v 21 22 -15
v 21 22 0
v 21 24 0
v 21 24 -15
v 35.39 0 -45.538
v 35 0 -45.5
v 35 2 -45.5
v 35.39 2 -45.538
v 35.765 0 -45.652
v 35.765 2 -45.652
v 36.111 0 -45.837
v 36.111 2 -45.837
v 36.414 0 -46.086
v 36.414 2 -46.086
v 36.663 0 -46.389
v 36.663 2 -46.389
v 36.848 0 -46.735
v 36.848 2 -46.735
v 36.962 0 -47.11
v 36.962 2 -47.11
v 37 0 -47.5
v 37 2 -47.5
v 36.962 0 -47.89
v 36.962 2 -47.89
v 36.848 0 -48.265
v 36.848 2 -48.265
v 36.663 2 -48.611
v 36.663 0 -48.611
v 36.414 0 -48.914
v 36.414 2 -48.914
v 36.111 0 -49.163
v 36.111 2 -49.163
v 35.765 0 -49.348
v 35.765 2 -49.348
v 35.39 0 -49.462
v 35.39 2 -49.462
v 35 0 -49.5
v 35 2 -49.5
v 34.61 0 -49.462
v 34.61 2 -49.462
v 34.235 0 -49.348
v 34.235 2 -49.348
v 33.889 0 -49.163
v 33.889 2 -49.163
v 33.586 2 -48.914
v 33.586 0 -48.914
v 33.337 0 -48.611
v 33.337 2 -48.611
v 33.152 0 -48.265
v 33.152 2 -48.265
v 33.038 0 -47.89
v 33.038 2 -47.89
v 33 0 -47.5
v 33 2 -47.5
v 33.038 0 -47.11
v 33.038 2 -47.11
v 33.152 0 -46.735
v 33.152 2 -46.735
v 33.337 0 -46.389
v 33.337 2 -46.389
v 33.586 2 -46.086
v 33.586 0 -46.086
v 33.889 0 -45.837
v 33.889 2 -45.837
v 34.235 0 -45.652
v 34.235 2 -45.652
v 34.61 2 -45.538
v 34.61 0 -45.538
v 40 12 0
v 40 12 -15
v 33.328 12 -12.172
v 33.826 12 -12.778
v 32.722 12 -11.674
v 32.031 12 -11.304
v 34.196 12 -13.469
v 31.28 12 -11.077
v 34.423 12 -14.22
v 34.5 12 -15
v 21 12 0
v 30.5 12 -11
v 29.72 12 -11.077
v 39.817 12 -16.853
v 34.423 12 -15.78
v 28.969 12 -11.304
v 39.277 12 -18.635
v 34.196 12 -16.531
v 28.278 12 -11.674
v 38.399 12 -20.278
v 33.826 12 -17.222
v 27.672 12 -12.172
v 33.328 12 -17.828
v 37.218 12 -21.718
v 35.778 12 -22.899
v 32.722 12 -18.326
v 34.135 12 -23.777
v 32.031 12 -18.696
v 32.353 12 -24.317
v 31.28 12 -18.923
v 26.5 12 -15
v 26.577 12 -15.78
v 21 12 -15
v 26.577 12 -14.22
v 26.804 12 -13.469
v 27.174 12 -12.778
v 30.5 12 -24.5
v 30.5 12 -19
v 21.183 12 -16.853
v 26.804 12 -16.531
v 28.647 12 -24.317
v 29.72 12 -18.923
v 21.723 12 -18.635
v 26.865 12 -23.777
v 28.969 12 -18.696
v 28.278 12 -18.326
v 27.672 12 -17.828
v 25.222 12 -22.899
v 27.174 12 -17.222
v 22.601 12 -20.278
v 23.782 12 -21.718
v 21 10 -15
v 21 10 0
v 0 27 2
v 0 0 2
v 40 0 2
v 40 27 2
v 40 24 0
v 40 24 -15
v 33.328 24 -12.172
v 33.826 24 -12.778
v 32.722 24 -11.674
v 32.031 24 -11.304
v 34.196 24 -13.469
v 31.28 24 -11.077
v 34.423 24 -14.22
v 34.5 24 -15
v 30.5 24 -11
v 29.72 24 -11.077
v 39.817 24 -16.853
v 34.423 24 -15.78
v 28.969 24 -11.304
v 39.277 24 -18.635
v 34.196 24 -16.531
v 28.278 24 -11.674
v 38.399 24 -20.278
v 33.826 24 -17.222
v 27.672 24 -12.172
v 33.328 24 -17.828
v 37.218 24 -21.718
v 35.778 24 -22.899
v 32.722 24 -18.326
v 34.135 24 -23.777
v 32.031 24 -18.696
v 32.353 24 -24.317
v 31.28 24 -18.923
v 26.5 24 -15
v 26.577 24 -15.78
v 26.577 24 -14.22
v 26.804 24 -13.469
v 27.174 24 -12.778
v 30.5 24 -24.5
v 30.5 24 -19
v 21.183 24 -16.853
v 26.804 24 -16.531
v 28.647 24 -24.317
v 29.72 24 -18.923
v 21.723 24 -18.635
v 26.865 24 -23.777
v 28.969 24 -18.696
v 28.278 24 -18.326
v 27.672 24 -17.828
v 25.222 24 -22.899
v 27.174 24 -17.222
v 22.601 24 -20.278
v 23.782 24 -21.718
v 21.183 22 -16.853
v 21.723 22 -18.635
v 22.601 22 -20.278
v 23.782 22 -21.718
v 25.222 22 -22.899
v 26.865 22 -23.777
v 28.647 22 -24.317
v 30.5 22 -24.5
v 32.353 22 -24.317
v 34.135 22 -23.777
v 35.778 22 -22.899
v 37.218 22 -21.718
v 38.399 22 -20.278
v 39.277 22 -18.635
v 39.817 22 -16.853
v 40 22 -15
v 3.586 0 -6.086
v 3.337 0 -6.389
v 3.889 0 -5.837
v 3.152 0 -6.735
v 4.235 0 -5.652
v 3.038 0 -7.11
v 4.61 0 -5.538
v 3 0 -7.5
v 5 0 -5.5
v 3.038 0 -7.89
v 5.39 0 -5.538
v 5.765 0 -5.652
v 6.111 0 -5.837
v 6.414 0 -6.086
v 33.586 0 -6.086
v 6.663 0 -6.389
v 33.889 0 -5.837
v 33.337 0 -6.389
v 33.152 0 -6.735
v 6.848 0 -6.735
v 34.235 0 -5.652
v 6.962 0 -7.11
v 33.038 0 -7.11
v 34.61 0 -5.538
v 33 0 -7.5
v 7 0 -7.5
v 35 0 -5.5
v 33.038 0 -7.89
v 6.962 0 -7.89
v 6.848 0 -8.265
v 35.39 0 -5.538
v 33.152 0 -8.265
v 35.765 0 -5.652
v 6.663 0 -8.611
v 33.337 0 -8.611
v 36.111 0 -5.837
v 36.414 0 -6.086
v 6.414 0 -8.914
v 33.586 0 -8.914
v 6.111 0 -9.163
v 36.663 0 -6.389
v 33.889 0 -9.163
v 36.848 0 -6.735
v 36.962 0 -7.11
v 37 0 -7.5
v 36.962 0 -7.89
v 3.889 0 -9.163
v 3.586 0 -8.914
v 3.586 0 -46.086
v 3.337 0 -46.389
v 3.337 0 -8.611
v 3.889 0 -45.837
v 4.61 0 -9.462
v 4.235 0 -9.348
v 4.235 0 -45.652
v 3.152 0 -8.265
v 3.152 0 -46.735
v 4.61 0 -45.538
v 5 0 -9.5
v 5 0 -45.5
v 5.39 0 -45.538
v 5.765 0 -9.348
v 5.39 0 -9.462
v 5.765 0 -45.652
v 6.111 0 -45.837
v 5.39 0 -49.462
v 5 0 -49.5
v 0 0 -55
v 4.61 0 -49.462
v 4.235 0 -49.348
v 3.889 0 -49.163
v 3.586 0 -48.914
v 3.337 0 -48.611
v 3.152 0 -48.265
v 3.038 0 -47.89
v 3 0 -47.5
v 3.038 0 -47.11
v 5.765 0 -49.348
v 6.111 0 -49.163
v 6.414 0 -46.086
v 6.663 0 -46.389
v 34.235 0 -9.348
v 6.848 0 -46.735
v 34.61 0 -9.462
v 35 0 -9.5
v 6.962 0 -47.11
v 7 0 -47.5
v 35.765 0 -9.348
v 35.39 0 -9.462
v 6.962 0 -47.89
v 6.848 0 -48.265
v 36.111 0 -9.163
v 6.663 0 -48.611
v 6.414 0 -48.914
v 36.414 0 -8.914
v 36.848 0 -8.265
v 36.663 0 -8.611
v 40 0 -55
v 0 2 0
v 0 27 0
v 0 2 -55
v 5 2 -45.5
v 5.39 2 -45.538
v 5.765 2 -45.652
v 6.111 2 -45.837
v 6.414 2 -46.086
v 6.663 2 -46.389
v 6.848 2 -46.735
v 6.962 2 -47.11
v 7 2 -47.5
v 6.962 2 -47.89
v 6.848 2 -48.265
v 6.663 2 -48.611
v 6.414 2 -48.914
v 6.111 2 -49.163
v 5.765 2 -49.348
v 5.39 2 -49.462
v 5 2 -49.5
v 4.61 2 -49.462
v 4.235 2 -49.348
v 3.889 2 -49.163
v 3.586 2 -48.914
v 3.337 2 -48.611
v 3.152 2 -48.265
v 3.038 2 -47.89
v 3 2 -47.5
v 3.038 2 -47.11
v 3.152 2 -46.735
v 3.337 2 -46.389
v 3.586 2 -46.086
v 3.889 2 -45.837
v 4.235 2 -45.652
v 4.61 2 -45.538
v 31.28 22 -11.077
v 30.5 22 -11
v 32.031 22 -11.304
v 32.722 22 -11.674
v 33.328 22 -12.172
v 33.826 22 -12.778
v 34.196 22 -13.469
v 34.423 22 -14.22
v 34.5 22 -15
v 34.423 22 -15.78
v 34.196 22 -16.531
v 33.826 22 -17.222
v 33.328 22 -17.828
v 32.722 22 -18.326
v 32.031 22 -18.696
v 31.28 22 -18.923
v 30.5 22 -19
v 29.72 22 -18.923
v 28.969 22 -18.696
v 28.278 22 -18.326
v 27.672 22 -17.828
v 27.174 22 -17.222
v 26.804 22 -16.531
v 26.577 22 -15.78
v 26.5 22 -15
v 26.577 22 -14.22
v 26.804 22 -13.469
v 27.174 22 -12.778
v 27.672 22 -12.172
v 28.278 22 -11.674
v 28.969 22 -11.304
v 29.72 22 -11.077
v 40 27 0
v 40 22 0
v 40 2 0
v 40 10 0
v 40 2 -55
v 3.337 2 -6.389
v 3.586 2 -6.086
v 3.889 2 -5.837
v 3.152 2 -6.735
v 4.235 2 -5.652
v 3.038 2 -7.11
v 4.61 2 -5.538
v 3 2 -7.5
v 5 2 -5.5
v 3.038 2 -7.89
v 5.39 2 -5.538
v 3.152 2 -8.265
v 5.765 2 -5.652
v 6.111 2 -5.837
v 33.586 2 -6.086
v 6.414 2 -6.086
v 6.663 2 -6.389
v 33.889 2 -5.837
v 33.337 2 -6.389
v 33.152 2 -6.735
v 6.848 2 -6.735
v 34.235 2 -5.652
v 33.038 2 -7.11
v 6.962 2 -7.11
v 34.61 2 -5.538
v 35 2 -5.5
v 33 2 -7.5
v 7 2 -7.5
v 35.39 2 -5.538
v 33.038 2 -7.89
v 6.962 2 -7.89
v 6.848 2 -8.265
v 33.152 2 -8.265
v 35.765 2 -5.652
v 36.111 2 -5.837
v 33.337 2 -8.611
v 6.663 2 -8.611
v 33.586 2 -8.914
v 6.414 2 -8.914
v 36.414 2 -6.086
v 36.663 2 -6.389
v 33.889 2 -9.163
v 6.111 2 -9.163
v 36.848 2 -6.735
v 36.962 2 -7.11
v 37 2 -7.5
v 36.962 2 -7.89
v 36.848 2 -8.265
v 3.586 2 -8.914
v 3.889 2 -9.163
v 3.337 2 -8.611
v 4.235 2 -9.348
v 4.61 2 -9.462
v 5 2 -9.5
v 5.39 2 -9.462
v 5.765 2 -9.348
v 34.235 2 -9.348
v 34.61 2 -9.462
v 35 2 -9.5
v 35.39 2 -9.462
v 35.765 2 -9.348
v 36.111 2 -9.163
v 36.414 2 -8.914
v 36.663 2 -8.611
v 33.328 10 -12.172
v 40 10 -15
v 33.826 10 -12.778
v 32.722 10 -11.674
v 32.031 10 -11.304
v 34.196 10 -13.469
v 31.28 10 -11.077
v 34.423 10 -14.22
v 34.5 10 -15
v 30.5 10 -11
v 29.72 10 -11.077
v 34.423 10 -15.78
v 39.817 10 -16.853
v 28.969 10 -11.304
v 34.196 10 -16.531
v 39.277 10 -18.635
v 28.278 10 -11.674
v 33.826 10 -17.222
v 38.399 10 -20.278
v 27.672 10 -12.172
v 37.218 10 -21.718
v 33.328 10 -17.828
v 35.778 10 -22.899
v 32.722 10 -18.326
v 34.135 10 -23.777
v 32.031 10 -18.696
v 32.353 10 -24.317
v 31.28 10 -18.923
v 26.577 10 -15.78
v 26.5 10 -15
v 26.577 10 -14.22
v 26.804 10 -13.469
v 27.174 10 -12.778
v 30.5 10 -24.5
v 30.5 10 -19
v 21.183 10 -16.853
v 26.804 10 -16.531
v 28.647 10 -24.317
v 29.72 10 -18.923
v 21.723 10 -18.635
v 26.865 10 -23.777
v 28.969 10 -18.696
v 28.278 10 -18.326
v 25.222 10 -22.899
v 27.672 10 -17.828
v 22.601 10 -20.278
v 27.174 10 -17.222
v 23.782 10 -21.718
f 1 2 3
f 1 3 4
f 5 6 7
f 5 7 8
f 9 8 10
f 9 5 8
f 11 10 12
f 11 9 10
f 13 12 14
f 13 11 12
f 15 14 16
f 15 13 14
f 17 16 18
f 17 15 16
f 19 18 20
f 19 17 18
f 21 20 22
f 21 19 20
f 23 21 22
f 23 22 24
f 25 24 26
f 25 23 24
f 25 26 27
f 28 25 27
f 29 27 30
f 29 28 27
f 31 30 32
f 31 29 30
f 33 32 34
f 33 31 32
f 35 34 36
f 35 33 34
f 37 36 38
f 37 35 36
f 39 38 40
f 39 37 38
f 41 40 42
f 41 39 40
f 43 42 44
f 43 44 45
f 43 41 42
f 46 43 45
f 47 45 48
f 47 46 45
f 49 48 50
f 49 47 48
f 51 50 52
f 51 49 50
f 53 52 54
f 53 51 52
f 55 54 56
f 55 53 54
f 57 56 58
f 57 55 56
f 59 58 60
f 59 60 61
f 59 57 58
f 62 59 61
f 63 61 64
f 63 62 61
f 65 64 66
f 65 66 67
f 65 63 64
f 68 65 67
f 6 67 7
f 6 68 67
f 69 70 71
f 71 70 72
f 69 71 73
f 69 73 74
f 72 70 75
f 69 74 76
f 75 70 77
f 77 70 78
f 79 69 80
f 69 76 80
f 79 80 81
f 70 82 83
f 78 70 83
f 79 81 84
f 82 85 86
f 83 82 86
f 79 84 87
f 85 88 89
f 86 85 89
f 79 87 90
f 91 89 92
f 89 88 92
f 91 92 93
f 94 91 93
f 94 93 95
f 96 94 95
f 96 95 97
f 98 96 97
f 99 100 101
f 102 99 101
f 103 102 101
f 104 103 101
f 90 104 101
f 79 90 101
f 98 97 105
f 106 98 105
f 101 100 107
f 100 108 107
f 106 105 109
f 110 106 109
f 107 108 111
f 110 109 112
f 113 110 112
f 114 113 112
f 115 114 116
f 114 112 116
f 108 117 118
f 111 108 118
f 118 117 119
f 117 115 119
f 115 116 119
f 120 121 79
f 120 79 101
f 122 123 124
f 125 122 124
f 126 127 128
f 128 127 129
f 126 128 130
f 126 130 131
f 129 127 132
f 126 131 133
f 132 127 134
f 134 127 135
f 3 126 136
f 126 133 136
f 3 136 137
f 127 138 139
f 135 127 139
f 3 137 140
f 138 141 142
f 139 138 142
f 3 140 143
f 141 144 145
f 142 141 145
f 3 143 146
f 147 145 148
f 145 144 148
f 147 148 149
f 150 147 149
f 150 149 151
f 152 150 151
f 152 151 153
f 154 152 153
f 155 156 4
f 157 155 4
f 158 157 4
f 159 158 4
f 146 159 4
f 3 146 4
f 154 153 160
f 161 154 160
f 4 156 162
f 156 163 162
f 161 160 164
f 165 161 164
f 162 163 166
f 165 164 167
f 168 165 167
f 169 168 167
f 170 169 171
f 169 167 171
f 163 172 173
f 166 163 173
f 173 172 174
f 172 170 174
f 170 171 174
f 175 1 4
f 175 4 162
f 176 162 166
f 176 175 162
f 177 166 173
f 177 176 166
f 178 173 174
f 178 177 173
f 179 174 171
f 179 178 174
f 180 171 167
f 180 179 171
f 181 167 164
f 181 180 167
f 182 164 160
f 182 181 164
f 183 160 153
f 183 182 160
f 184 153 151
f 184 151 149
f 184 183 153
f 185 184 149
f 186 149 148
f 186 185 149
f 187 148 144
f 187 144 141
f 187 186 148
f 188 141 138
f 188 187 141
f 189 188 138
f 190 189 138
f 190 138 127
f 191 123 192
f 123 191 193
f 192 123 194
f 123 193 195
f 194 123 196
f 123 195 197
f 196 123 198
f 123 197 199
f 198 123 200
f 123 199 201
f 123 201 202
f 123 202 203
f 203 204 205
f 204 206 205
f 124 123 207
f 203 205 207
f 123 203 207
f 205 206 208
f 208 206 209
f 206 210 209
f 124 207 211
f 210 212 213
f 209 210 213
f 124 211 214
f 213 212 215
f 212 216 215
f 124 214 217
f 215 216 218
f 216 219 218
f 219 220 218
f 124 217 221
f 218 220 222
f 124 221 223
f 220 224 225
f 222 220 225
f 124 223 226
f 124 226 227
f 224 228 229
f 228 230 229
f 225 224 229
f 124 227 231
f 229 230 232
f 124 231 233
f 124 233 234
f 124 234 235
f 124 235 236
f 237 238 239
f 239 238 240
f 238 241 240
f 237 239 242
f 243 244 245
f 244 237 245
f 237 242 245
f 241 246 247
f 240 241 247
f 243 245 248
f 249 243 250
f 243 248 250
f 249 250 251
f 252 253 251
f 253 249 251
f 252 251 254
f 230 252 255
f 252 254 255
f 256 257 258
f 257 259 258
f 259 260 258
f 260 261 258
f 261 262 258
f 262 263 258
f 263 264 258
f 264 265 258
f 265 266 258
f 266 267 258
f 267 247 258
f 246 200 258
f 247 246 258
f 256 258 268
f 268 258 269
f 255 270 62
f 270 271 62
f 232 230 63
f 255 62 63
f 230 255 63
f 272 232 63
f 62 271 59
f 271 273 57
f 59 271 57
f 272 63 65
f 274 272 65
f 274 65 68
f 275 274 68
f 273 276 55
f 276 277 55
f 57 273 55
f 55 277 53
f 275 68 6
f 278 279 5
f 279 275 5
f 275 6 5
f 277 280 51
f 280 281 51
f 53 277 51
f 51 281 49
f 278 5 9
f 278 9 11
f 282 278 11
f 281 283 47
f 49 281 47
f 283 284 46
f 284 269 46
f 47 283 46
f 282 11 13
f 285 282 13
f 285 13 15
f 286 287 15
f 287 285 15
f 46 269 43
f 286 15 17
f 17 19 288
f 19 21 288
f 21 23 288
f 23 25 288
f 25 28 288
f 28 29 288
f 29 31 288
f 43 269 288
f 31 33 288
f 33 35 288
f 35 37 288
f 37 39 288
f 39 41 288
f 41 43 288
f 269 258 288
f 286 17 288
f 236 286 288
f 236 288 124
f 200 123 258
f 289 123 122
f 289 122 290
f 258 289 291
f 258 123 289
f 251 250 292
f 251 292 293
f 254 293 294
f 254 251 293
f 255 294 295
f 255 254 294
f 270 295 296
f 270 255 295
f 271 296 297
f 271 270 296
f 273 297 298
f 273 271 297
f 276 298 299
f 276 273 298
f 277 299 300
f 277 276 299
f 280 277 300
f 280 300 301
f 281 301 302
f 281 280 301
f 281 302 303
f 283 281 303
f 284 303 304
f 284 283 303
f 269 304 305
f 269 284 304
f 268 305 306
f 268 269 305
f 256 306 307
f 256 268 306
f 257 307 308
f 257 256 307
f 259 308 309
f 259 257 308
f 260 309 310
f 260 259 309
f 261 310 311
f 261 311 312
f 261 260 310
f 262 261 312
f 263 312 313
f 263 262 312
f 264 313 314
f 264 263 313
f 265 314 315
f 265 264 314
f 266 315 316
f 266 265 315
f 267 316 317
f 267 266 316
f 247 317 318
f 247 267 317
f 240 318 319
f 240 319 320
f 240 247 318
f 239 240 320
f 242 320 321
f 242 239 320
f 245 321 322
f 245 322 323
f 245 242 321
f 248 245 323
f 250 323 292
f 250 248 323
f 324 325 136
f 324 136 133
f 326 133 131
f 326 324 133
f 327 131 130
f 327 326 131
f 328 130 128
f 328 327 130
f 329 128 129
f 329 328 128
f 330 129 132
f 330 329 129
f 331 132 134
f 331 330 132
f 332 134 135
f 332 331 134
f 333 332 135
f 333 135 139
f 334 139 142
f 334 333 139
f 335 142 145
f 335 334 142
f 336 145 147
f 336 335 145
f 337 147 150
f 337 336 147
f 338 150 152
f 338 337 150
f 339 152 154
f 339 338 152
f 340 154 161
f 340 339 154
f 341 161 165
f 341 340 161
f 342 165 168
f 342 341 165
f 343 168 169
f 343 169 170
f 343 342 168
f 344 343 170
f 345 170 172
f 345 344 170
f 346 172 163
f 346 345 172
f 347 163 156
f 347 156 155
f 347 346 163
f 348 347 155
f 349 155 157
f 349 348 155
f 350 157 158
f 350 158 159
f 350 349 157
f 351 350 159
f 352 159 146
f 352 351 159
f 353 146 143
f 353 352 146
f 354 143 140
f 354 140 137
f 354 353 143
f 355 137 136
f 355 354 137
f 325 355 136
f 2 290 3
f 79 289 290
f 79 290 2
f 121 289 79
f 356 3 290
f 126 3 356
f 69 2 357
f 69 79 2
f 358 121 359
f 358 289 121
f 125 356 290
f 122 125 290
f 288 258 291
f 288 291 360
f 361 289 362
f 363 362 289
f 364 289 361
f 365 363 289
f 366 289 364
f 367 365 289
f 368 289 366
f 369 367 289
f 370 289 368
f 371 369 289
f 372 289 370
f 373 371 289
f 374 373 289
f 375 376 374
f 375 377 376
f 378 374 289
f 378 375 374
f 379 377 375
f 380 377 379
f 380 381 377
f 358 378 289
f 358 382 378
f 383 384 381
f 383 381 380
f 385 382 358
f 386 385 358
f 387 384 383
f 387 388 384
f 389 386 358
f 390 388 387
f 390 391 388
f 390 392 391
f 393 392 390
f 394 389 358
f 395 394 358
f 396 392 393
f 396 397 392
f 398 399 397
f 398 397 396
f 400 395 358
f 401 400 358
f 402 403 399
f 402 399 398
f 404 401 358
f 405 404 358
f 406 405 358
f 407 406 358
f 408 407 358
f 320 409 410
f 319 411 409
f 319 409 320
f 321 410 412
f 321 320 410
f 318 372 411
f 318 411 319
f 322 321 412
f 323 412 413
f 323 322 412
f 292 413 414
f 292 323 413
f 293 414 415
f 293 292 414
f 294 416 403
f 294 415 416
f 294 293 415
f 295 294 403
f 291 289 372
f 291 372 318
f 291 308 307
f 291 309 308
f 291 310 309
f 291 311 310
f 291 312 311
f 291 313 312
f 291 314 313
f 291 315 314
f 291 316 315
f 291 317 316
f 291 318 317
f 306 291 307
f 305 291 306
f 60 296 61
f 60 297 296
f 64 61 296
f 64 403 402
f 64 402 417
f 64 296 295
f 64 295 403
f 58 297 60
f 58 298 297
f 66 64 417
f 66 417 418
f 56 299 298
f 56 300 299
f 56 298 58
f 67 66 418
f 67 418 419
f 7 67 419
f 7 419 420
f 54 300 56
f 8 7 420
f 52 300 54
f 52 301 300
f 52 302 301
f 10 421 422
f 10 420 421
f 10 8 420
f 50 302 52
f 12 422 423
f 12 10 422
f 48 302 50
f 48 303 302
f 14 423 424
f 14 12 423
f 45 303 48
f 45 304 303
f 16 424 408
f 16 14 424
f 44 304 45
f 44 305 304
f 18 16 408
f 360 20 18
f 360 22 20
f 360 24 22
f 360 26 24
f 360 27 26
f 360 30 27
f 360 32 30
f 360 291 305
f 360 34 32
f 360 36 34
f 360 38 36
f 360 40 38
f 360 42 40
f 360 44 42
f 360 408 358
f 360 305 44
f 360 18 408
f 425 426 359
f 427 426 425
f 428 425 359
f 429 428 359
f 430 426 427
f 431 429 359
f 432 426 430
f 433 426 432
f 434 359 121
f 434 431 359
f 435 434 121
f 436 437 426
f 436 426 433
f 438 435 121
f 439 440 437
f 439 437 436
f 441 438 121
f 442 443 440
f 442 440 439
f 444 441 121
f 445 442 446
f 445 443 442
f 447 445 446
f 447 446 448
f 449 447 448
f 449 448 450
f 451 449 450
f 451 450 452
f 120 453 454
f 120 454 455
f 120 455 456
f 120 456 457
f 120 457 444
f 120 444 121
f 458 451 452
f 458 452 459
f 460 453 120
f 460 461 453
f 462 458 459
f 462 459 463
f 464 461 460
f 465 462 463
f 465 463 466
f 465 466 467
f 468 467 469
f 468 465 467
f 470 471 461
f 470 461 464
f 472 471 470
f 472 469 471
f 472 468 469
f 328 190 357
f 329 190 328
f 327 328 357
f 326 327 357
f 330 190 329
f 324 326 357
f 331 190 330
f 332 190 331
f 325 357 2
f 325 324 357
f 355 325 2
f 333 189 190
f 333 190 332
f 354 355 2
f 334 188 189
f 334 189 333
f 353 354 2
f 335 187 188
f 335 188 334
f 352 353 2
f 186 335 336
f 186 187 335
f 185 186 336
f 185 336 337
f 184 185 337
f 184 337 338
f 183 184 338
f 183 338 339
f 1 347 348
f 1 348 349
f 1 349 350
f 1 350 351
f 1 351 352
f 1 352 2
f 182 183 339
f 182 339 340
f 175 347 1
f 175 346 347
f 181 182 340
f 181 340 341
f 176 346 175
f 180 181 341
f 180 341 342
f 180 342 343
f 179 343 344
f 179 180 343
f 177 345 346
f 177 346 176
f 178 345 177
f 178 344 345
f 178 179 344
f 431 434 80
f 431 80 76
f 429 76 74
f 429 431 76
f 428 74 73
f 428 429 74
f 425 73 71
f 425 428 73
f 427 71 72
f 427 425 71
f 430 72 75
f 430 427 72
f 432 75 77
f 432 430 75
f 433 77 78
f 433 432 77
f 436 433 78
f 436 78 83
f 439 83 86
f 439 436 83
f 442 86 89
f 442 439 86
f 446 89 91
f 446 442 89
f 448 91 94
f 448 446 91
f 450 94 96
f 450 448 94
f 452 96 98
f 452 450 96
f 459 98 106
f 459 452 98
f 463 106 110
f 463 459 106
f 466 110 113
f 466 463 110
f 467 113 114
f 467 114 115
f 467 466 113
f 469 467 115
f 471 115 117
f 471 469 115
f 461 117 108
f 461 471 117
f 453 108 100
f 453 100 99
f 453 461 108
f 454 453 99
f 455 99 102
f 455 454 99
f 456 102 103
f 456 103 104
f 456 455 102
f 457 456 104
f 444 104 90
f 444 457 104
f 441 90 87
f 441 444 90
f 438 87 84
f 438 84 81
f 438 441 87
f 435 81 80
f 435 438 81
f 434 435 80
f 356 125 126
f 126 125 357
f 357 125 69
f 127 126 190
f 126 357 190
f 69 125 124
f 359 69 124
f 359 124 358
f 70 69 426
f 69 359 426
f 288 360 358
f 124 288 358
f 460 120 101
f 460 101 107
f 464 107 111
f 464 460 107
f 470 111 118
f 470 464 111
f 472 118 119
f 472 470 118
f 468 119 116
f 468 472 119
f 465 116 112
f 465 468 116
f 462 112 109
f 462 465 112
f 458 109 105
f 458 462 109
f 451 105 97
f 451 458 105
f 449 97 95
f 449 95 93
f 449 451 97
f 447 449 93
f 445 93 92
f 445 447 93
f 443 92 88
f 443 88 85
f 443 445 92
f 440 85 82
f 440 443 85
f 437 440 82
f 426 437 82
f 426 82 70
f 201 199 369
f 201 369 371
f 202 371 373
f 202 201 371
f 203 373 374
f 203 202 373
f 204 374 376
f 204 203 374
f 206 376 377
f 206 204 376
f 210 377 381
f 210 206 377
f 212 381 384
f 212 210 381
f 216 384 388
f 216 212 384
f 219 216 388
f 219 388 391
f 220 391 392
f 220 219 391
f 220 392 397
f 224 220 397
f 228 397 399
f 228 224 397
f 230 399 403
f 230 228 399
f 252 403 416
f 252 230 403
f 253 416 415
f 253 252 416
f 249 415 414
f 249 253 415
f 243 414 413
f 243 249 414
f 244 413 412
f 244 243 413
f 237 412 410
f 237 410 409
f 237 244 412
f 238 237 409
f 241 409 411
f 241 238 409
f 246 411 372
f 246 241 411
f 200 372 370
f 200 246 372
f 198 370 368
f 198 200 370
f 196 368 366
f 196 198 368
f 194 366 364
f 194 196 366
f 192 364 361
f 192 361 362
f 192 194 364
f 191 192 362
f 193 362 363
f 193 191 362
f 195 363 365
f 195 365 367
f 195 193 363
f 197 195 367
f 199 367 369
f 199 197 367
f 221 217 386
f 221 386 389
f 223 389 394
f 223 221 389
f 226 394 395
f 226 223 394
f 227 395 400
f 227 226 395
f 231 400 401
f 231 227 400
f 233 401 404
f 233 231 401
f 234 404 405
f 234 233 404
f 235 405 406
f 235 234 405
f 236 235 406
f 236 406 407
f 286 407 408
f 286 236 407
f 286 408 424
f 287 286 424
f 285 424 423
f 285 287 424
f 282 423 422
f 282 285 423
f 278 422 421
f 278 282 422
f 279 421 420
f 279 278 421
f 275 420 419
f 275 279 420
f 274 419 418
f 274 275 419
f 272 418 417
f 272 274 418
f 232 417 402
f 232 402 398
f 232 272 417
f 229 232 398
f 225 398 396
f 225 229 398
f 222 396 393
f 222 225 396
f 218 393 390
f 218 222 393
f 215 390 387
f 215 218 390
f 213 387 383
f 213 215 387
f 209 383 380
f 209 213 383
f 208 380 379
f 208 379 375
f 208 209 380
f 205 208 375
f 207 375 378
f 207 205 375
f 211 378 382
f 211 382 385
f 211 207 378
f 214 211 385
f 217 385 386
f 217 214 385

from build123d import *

# Parameters (mm, degrees)
CROQUIS2_W              = 40
CROQUIS2_H              = 55
CROQUIS2_R              = 2
SALIENTE_EXTRUIR1_DEPTH = 2
CROQUIS3_W              = 40
CROQUIS3_H              = 2
SALIENTE_EXTRUIR2_DEPTH = 42
CROQUIS4_R              = 4
SALIENTE_EXTRUIR3_DEPTH = 2
MATRIZL1_COUNT          = 2
MATRIZL1_PITCH          = 12
CROQUIS6_W              = 40
CROQUIS6_H              = 15
CORTAR_EXTRUIR1_DEPTH   = 10


with BuildPart() as part:
    # Croquis2 → Saliente-Extruir1 (new body)
    with BuildSketch(Plane(origin=(0, 0, 0), x_dir=(1, 0, 0), z_dir=(0, 1, 0))):
        with Locations((20, 27.5)):
            Rectangle(CROQUIS2_W, CROQUIS2_H)
        with Locations(Location((5, 47.5, 0), (0, 0, 270))):
            Circle(CROQUIS2_R, mode=Mode.SUBTRACT)
        with Locations(Location((35, 47.5, 0), (0, 0, 270))):
            Circle(CROQUIS2_R, mode=Mode.SUBTRACT)
        with Locations(Location((35, 7.5, 0), (0, 0, 270))):
            Circle(CROQUIS2_R, mode=Mode.SUBTRACT)
        with Locations(Location((5, 7.5, 0), (0, 0, 270))):
            Circle(CROQUIS2_R, mode=Mode.SUBTRACT)
    extrude(amount=SALIENTE_EXTRUIR1_DEPTH)

    # Croquis3 → Saliente-Extruir2 (add)
    with BuildSketch(Plane(origin=(0, 0, 0), x_dir=(1, 0, 0), z_dir=(0, 1, 0))):
        with Locations((20, -1)):
            Rectangle(CROQUIS3_W, CROQUIS3_H)
    extrude(amount=SALIENTE_EXTRUIR2_DEPTH)

    # Croquis4 → Saliente-Extruir3 (add)
    with BuildSketch(Plane(origin=(0, 22, 0), x_dir=(1, 0, 0), z_dir=(0, 1, 0))):
        with BuildLine():
            Line((40, 15), (40, 0))
            Line((40, 0), (21, 0))
            Line((21, 0), (21, 15))
            ThreePointArc((21, 15), (30.5, 24.5), (40, 15))
        make_face()
        with Locations(Location((30.5, 15, 0), (0, 0, 270))):
            Circle(CROQUIS4_R, mode=Mode.SUBTRACT)
    saliente_extruir3 = extrude(amount=SALIENTE_EXTRUIR3_DEPTH)

    # MatrizL1: Saliente-Extruir3 ×2
    with Locations(*[(0, -i * MATRIZL1_PITCH, 0) for i in range(1, MATRIZL1_COUNT)]):
        add(saliente_extruir3)

    # Croquis6 → Cortar-Extruir1 (cut)
    with BuildSketch(Plane(origin=(0, 0, 0), x_dir=(-1, 0, 0), z_dir=(0, 0, -1))):
        with Locations((-20, 34.5)):
            Rectangle(CROQUIS6_W, CROQUIS6_H)
    extrude(amount=-CORTAR_EXTRUIR1_DEPTH, mode=Mode.SUBTRACT)


solid = part.part
